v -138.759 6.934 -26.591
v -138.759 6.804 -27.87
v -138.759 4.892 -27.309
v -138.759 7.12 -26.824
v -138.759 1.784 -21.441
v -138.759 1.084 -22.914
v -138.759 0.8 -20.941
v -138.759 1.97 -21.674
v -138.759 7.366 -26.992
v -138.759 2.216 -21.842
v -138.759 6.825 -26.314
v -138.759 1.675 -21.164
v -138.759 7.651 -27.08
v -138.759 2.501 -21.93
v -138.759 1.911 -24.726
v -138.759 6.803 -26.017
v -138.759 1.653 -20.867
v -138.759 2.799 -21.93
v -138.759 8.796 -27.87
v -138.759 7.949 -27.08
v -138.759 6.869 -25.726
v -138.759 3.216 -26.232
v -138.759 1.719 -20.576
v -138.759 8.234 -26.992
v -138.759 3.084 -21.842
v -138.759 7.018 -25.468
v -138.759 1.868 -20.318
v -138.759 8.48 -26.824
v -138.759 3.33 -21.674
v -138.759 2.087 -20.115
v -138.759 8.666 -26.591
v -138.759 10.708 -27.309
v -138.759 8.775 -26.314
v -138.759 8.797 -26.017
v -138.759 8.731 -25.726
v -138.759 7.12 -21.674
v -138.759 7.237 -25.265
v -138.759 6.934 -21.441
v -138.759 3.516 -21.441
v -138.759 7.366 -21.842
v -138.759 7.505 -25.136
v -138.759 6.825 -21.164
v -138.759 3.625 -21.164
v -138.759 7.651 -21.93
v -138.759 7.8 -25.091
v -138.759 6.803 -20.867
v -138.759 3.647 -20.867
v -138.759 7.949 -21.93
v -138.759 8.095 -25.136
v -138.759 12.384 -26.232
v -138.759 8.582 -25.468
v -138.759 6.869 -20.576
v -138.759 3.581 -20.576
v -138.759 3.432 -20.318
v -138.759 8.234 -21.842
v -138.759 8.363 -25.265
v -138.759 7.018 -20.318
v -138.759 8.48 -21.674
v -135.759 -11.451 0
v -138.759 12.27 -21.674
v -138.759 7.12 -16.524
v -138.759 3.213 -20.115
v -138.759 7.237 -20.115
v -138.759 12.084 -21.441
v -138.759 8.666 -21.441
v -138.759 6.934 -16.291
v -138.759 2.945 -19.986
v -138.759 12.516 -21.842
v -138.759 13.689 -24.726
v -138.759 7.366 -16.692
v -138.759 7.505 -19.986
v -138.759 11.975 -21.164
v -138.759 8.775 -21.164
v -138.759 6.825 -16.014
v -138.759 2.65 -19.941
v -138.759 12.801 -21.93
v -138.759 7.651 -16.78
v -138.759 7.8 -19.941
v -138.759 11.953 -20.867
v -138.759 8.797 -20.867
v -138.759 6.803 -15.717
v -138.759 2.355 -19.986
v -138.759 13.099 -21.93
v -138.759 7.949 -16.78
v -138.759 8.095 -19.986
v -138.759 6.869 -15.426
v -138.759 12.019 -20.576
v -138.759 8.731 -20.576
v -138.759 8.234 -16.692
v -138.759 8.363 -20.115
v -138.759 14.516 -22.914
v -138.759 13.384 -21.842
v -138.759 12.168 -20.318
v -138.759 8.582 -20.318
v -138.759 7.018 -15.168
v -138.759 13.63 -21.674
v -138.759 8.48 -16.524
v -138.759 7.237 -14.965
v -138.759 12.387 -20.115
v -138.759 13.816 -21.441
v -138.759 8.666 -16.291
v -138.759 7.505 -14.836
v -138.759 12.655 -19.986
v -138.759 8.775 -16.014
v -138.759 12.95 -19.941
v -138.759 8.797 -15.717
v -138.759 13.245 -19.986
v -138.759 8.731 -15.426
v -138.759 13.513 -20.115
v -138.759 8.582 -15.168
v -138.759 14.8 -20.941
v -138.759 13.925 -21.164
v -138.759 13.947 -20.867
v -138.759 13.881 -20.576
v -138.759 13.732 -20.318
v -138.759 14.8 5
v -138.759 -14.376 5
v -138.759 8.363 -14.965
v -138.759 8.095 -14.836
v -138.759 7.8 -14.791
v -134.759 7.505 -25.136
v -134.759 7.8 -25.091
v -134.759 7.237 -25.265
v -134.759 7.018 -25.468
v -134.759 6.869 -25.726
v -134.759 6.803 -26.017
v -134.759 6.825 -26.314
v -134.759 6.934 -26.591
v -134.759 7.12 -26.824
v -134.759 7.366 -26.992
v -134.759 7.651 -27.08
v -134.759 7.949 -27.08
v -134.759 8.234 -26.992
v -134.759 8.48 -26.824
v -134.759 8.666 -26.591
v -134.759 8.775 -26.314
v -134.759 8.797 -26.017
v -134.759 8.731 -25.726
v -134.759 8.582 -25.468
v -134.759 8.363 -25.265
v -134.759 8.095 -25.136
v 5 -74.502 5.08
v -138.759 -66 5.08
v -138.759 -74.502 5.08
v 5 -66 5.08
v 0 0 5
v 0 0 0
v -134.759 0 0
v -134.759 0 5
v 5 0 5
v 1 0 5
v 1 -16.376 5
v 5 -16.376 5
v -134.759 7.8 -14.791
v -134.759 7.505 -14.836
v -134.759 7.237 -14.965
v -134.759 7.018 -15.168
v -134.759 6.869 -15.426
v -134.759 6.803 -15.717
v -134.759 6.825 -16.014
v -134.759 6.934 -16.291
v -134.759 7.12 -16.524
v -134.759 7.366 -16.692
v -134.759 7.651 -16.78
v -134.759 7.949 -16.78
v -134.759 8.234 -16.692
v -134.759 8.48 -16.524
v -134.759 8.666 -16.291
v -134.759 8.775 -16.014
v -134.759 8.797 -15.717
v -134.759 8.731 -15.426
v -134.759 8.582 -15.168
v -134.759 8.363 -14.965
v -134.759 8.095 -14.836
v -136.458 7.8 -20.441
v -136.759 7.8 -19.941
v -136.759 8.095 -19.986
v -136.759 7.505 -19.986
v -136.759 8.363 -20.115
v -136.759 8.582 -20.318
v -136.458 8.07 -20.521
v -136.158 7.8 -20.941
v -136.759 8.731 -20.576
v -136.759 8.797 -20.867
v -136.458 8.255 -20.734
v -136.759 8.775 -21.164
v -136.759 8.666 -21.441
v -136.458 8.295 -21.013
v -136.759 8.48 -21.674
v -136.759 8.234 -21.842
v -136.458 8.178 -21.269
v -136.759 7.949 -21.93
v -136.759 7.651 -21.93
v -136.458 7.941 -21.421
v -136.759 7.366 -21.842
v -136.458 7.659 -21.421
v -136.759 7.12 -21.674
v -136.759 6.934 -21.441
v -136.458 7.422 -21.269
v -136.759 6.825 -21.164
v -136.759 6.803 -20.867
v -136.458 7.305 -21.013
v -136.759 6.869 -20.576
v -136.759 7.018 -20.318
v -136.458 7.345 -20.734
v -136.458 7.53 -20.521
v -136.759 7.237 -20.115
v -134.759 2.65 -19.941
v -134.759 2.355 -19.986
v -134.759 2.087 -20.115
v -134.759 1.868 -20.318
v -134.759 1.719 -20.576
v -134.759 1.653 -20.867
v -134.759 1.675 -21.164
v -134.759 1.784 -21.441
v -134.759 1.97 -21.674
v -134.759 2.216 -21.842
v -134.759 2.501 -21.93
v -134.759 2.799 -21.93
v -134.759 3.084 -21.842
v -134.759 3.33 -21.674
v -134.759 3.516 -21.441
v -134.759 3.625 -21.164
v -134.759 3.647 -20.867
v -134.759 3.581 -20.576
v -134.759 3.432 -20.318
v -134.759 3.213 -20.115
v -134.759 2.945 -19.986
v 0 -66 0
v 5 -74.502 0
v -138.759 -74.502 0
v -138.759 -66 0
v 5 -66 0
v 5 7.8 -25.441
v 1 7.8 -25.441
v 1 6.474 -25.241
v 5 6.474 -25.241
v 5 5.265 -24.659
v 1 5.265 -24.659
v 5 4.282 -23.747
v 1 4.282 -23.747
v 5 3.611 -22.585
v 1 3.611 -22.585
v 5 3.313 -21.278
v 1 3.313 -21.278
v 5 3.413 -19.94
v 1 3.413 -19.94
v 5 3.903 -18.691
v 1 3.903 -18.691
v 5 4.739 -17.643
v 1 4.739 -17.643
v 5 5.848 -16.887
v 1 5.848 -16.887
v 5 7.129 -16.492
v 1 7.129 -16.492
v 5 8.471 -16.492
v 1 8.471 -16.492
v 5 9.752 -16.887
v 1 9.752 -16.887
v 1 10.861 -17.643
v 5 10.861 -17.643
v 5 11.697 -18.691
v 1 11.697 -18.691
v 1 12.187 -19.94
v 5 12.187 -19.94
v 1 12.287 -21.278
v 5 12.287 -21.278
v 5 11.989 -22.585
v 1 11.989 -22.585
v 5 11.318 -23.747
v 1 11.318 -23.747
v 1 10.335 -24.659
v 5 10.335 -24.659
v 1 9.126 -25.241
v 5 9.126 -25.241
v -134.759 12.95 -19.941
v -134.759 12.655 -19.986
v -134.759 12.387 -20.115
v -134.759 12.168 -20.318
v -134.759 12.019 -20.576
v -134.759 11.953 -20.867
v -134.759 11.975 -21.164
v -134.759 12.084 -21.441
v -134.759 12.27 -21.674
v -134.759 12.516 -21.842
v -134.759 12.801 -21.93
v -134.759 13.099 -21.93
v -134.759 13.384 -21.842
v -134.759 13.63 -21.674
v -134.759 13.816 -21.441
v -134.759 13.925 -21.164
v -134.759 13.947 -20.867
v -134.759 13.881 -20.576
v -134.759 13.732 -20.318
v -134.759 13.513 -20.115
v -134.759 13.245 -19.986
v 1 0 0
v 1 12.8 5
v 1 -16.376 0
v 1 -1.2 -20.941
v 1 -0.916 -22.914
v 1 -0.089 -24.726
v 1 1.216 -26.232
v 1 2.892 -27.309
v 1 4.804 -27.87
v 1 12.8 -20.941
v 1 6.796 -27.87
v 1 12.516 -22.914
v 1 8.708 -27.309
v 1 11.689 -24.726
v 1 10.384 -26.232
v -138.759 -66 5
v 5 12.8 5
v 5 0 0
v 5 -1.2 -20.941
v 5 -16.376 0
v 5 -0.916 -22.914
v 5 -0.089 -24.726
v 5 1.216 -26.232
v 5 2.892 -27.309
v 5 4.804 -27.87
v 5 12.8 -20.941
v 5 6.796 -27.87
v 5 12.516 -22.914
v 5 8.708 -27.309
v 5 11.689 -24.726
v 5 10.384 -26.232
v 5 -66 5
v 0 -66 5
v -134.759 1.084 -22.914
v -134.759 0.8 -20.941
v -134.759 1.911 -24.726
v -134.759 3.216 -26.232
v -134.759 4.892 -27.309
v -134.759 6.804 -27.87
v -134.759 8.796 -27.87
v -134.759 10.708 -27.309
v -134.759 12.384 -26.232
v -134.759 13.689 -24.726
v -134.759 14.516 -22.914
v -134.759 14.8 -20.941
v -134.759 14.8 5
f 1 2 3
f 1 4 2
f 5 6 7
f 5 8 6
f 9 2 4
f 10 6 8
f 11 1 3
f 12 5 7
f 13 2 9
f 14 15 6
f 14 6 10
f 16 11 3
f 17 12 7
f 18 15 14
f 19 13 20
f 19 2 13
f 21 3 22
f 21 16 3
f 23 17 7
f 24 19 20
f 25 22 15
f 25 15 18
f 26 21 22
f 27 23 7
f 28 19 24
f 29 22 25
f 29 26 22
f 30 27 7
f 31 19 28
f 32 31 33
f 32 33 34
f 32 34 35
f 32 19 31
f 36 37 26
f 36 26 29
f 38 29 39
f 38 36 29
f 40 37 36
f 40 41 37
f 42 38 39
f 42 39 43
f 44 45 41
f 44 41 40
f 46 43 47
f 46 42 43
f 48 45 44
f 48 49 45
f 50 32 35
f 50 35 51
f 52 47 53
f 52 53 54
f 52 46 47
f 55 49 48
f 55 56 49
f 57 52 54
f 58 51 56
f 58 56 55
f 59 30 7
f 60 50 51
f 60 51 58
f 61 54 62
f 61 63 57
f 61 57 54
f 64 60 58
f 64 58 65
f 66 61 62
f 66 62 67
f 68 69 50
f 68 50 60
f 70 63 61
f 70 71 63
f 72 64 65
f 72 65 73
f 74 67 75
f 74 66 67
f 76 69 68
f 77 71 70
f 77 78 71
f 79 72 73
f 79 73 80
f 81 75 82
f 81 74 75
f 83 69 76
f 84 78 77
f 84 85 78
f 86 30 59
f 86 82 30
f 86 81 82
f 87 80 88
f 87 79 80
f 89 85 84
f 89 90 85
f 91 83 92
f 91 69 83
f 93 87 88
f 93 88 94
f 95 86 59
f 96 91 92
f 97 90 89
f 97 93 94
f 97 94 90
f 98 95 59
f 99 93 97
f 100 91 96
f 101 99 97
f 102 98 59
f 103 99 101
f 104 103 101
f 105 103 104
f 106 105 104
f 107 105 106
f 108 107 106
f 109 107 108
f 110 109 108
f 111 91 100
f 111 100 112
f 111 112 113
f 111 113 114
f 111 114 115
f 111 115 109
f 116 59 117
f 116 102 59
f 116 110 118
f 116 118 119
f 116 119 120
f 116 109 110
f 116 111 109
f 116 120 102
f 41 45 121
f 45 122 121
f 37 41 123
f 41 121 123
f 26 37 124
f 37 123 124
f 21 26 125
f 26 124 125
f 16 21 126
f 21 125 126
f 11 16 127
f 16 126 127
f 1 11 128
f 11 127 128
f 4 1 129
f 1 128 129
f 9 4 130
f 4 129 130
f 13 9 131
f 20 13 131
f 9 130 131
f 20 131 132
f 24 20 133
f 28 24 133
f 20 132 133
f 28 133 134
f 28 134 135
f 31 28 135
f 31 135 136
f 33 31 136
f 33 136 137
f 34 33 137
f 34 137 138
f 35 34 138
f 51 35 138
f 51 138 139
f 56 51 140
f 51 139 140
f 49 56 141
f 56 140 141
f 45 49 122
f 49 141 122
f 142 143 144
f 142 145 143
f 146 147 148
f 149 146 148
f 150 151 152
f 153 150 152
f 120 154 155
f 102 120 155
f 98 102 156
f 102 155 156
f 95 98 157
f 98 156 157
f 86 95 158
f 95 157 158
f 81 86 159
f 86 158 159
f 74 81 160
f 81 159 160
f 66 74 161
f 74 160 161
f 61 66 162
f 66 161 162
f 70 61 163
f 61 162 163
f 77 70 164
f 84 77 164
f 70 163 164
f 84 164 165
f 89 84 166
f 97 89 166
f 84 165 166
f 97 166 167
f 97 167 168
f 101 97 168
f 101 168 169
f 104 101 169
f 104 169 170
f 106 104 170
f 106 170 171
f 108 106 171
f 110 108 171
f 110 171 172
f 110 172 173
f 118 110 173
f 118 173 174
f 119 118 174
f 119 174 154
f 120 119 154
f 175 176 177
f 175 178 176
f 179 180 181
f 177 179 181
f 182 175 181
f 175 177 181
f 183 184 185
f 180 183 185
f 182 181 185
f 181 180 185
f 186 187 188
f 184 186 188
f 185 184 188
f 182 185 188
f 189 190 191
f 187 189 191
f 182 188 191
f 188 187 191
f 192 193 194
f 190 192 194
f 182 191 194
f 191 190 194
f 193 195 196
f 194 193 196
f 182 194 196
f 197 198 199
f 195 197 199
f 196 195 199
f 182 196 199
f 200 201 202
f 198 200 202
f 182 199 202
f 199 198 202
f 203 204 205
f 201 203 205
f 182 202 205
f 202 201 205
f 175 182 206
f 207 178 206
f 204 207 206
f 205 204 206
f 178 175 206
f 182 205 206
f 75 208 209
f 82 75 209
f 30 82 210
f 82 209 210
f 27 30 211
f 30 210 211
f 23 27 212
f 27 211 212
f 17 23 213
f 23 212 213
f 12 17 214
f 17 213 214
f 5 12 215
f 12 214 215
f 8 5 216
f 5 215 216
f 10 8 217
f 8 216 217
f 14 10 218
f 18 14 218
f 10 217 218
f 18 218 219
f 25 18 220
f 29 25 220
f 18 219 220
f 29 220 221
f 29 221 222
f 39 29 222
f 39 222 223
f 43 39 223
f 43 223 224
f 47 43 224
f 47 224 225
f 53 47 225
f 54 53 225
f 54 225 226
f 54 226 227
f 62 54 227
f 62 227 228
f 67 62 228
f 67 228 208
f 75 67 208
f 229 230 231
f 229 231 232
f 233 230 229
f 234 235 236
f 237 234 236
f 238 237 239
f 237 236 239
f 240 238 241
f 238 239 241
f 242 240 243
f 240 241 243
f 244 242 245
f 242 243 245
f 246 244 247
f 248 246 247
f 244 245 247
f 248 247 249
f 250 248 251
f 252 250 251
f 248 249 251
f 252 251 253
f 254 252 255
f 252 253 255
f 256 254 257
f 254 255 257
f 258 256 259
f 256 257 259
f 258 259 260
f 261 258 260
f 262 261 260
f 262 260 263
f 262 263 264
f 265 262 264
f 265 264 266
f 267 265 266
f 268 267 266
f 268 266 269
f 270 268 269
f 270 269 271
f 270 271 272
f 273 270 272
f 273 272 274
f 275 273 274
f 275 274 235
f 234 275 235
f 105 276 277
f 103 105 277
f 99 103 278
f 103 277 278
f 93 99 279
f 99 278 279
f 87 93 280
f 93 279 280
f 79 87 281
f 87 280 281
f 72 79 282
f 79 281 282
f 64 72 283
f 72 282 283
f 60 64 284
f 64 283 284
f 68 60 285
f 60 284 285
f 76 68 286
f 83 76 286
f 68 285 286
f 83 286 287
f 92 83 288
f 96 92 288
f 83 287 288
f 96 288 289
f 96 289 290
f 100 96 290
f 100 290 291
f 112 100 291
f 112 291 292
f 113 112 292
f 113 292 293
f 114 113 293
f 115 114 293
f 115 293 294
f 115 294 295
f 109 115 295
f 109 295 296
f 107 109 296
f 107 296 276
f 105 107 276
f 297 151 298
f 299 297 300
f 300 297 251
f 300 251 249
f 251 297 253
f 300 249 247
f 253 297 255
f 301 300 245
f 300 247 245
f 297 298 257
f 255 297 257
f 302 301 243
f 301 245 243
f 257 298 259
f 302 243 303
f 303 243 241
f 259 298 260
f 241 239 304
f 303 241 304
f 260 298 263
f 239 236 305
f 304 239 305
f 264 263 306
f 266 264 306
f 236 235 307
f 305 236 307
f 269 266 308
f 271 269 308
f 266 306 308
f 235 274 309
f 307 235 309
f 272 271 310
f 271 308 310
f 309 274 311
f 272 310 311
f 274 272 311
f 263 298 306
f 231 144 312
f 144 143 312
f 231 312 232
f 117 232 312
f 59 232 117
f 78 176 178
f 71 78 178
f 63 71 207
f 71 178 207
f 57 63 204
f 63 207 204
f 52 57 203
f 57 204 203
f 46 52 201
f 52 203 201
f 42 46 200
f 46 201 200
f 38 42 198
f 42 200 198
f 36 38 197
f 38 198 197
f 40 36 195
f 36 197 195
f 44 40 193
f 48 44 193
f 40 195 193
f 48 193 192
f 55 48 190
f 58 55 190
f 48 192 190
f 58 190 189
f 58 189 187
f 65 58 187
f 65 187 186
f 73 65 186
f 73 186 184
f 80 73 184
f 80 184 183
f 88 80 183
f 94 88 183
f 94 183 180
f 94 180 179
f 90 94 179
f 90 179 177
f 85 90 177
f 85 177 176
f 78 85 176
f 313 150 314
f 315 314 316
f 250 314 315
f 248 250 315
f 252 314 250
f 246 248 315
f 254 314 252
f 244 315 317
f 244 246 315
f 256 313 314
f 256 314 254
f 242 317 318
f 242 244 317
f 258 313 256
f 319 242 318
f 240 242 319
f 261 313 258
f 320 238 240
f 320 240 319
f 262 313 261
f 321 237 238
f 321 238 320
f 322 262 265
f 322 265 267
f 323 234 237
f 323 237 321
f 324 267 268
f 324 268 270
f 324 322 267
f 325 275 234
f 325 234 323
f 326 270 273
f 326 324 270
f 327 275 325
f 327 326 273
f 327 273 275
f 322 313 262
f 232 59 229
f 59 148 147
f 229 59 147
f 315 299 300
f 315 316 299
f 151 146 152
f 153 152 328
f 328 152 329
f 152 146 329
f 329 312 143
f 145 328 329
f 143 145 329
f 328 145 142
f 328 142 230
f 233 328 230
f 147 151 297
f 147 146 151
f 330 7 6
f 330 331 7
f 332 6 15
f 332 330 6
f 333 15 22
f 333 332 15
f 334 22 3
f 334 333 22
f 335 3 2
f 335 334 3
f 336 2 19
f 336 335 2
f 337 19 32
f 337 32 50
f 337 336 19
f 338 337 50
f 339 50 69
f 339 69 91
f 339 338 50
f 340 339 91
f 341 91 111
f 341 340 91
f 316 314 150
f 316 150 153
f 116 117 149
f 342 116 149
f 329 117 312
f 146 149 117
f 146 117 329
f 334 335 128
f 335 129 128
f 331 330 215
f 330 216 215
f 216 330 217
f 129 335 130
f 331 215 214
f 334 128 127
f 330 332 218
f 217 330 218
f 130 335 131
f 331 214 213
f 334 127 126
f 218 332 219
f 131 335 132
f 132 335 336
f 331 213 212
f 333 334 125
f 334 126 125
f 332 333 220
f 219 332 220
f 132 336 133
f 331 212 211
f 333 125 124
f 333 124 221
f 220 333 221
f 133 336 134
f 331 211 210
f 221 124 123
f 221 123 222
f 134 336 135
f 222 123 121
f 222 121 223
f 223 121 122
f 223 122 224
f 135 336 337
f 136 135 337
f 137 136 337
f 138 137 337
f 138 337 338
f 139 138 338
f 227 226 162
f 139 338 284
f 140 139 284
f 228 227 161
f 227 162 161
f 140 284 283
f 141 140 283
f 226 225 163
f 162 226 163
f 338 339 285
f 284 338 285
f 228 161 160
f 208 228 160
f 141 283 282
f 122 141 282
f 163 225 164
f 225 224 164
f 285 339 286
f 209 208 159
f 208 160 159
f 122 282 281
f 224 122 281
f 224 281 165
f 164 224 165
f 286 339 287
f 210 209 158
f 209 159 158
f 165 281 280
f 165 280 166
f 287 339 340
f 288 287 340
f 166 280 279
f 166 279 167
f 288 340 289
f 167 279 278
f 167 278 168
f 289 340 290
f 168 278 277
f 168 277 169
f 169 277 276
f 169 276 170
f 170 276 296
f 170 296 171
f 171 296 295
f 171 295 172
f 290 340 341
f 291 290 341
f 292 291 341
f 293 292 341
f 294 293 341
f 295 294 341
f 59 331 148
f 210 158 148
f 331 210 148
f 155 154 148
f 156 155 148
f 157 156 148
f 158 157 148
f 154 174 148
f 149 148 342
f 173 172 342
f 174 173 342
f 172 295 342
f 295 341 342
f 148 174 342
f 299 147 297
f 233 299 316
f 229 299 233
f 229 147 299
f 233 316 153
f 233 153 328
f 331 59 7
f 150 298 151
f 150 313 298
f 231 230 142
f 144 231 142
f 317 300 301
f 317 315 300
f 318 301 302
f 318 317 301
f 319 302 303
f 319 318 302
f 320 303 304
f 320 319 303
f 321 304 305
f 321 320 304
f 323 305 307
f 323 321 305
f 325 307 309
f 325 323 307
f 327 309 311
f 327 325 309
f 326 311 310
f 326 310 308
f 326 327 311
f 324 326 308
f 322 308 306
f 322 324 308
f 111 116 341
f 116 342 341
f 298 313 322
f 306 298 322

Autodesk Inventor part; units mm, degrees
ref_plane "YZ Plane" through (0, 0, 0) normal (1, 0, 0) x (0, 1, 0)
ref_plane "XZ Plane" through (0, 0, 0) normal (0, 1, 0) x (-1, 0, 0)
ref_plane "XY Plane" through (0, 0, 0) normal (0, 0, 1) x (1, 0, 0)
sketch "Boceto1" plane through (0, 0, 0) normal (0, 0, 1) x (1, 0, 0)
  line L0 (0, 0) -> (-127, 0) projected
  line L1 (-5, -66) -> (-122, -66) projected
  line L2 (-127, 0) -> (0, 0)
  line L3 (0, 0) -> (0, -66)
  line L4 (0, -66) -> (-127, -66)
  line L5 (-127, -66) -> (-127, 0)
extrude "Extrusión1" add sketch "Boceto1" along normal blind 5
move faces "Desplazar1" translate (-7.7586, 0, 0) faces at (-127, -44, 1.6667)
sketch "Boceto3" plane through (-134.7586, -66, 0) normal (-1, 0, 0) x (0, 0, 1)
  line L0 (-19.6414, 77.5) -> (-19.6414, 74.1) projected
  line L1 (-22.2414, 74.1) -> (-22.2414, 77.5) projected
  line L2 (-22.2414, 66.1) -> (-22.2414, 69.5) projected
  line L3 (-19.6414, 69.5) -> (-19.6414, 66.1) projected
  line L4 (-15.2414, 70.5) -> (-18.6414, 70.5) projected
  line L5 (-18.6414, 73.1) -> (-15.2414, 73.1) projected
  line L6 (-26.6414, 73.1) -> (-23.2414, 73.1) projected
  line L7 (-23.2414, 70.5) -> (-26.6414, 70.5) projected
  arc A0 (-19.6414, 77.5) -> (-22.2414, 77.5) centre (-20.9414, 77.5) ccw projected
  arc A1 (-22.2414, 66.1) -> (-19.6414, 66.1) centre (-20.9414, 66.1) ccw projected
  line L8 (5, 66) -> (5, 78.8)
  line L9 (5, 66) -> (5, 64.8)
  line L10 (5, 78.8) -> (5, 49.624)
  line L11 (5, 66) -> (5, 0) projected
  arc A2 (-19.6414, 79.5) -> (-22.2414, 79.5) centre (-20.9414, 79.5) ccw projected
  arc A3 (-22.2414, 68.1) -> (-19.6414, 68.1) centre (-20.9414, 68.1) ccw projected
  line L12 (5, 49.624) -> (5, 51.624)
  line L13 (5, 51.624) -> (-20.9414, 66.8)
  line L14 (5, 78.8) -> (5, 80.8)
  line L15 (5, 80.8) -> (-20.9414, 80.8)
  circle A4 centre (-20.9414, 73.8) radius 0.75 projected
  arc A5 (-20.9414, 80.8) -> (-20.9414, 66.8) centre (-20.9414, 73.8) ccw
  circle A6 centre (-20.9414, 73.8) radius 1.45 projected
  circle A7 centre (-20.9414, 78.95) radius 0.5 projected
  point P0 (0, 66)
  point P1 (-20.9414, 71.8)
  point P2 (-20.9414, 78.8)
  dimension "d28" = 29.176
  dimension "d29" = 2
  dimension "d30" = 2
extrude "Extrusión2" add sketch "Boceto3" along normal blind 4 contours L0 A6 L1 A0 A7 | A6 | A7 A0 | A0 A7 | A5 L15 L14 L8 L9 L10 L13 A1 L3 A3 L2 | L2 A3 A5 | L13 A3 L3 A1 | A4
move faces "Desplazar2" translate (-4, 0, 0) faces at (-134.7586, -30.609, 1.6667)
sketch "Boceto4" plane through (-138.7586, -66, 0) normal (-1, 0, 0) x (0, 0, 1)
  circle A0 centre (-15.7914, 73.8) radius 0.5 projected
  circle A1 centre (-20.9414, 68.65) radius 0.5 projected
  circle A2 centre (-26.0914, 73.8) radius 0.5 projected
  circle A3 centre (-20.9414, 78.95) radius 0.5 projected
  circle A4 centre (-20.9414, 78.95) radius 0.5 projected
  circle A5 centre (-20.9414, 78.95) radius 0.5 projected
  point P0 (0, 66)
hole "Agujero1" at (-138.7586, 7.8, -15.7914) at (-138.7586, 2.65, -20.9414) at (-138.7586, 7.8, -26.0914) direction (1, 0, 0) diameter 2 end up to surface
ref_plane "Plano de trabajo1" through (0, 0, -79) normal (1, 0, 0) x (0, 0, -1)
offset faces "Tamaño1" outward 5 faces at (0, -22, 1.6667)
sketch "Boceto6" plane through (5, -66, 0) normal (1, 0, 0) x (0, 0, -1)
  arc A0 (20.9414, 64.8) -> (20.9414, 78.8) centre (20.9414, 71.8) ccw projected
  line L0 (-5, 78.8) -> (20.9414, 78.8) projected
  line L1 (-5, 78.8) -> (-5, 66) projected
  line L2 (-5, 0) -> (-5, 66) projected
  line L3 (0, 49.6235) -> (20.9414, 64.8) projected
  line L4 (0, 49.6235) -> (-5, 49.6235)
  line L5 (-5, 0) -> (-5, 66) projected
  point P0 (0, 66)
extrude "Extrusión3" add sketch "Boceto6" against normal blind 4
sketch "Boceto7" plane through (5, -66, 5) normal (1, 0, 0) x (0, 0, -1)
  circle A0 centre (25.9414, 73.8) radius 1.45 projected
  point P0 (5, 66)
hole "Agujero2" at (5, 7.8, -20.9414) direction (-1, 0, 0) diameter 9 end up to surface
hole "Agujero3" at (-138.7586, 7.8, -20.9414) direction (1, 0, 0) diameter 2 depth 2 tip angle 118
sketch "Boceto9" plane through (-138.7586, -66, 0) normal (-1, 0, 0) x (0, 0, 1)
  circle A0 centre (-20.9414, 78.95) radius 0.5 projected
  point P0 (0, 66)
hole "Agujero4" at (-138.7586, 12.95, -20.9414) direction (1, 0, 0) diameter 2 end up to surface
sketch "Boceto10" plane through (5, -66, 5) normal (1, 0, 0) x (0, 0, -1)
  circle A0 centre (49.5, 31.4977) radius 40 projected
  line L0 (49.5, -8.5023) -> (-0.0805, -8.5023)
  line L1 (-0.0805, -8.5023) -> (5, -8.5023)
  line L2 (5, -8.5023) -> (5, 0)
  line L3 (5, 0) -> (-0.0805, 0)
  line L4 (-0.0805, 0) -> (-0.0805, -8.5023)
  point P0 (5, 66)
extrude "Extrusión4" add sketch "Boceto10" against normal up to surface (143.7586 mm away) contours L0 L4 L3 L2
properties part number "pala"
